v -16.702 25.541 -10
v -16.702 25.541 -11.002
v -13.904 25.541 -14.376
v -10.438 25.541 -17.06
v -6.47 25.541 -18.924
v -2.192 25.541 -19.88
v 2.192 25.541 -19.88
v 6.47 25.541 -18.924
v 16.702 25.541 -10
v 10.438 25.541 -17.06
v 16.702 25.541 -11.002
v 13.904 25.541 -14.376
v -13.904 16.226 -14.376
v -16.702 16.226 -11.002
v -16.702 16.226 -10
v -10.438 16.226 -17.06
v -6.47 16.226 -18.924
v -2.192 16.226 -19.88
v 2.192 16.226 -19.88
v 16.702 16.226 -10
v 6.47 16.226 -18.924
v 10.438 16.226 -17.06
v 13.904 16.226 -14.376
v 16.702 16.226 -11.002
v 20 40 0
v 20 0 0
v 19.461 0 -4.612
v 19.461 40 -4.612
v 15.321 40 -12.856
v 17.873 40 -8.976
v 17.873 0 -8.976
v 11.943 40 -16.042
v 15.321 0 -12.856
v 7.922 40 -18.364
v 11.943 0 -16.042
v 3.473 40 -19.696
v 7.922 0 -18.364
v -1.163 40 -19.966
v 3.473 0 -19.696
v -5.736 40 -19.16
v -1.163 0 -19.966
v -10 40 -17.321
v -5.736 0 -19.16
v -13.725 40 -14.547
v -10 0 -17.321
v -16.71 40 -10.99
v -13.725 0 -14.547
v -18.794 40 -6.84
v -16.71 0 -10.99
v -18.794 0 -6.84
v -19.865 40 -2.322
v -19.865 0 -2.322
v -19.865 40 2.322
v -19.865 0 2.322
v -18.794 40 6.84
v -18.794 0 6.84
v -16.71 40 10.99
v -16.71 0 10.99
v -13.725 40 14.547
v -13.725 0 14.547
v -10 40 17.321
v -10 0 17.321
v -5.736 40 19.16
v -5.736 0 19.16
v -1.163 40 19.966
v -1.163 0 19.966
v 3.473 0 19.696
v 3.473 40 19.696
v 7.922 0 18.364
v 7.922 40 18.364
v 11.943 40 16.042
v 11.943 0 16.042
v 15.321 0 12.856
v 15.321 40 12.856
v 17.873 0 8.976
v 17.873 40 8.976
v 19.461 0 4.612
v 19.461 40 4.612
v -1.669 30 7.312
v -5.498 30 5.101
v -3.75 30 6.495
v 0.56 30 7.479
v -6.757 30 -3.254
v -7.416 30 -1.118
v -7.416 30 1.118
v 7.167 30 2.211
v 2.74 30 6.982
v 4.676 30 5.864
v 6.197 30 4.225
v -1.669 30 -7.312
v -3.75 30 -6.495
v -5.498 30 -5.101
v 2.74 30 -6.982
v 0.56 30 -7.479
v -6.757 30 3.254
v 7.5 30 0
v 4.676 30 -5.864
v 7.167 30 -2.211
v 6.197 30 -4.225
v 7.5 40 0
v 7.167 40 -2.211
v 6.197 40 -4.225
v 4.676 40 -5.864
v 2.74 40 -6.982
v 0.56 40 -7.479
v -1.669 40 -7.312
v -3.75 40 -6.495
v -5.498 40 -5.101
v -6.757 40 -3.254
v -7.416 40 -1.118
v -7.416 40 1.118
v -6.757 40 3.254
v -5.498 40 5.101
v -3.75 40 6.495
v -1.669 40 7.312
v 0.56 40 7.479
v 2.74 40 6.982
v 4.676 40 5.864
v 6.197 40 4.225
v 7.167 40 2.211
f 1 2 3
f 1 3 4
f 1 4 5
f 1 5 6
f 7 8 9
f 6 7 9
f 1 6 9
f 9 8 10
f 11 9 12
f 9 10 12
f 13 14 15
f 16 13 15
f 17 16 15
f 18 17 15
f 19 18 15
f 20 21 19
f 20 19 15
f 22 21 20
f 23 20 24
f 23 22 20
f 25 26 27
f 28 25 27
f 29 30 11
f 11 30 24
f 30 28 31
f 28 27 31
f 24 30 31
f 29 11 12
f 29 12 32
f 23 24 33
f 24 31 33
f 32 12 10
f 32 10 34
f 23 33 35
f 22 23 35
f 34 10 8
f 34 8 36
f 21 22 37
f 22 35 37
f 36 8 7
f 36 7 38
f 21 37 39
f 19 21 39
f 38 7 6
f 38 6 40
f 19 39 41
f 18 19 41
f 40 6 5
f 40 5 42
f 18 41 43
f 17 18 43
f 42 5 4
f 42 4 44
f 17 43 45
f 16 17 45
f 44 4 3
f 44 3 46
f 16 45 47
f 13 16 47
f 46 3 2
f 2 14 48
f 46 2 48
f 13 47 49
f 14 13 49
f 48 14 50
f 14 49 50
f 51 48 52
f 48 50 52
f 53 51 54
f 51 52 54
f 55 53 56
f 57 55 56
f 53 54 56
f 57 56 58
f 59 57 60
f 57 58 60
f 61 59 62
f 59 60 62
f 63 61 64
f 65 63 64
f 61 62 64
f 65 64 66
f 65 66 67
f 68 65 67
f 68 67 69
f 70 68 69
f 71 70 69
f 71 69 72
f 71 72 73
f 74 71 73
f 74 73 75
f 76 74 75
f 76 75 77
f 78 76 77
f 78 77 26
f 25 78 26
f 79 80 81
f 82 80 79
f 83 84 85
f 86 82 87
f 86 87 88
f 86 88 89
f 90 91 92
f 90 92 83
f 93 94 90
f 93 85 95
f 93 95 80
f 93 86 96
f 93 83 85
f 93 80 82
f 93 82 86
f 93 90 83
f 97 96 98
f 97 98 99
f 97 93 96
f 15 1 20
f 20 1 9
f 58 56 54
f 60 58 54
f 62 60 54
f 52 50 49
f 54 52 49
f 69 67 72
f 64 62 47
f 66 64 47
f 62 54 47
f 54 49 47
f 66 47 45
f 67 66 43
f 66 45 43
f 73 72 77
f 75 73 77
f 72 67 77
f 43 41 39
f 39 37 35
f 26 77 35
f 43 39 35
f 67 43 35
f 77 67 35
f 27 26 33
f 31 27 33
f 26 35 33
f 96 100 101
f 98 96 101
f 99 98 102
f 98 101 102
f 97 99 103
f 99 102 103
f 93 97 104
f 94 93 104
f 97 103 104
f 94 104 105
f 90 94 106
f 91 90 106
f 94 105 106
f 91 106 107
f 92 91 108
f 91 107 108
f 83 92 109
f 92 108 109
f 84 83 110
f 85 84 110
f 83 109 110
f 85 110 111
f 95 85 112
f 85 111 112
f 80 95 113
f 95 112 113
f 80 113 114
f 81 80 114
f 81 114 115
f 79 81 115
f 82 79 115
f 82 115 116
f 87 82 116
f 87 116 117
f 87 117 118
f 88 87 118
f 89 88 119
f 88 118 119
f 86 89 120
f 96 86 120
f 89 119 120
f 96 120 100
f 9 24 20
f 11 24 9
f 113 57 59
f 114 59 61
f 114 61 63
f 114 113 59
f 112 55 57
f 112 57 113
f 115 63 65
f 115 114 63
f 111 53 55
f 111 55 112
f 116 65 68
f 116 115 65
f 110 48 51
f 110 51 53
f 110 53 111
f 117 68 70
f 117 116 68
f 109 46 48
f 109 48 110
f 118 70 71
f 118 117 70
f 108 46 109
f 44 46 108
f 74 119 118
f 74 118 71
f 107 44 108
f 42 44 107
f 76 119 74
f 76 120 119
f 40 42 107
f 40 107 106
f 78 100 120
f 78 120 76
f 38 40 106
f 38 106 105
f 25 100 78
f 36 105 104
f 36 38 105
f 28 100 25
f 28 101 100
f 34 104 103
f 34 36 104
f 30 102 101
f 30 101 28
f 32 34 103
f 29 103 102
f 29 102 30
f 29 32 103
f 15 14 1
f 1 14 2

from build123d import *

# Parameters (mm, degrees)
SKETCH1_R           = 20
BOSS_EXTRUDE1_DEPTH = 40
SKETCH2_R           = 7.5
CUT_EXTRUDE1_DEPTH  = 10
SKETCH3_W           = 33.40458463
SKETCH3_H           = 9.314739944
CUT_EXTRUDE2_DEPTH  = 10


with BuildPart() as part:
    # Sketch1 → Boss-Extrude1 (new body)
    with BuildSketch(Plane(origin=(0, 0, 0), x_dir=(1, 0, 0), z_dir=(0, 1, 0))):
        Circle(SKETCH1_R)
    extrude(amount=BOSS_EXTRUDE1_DEPTH)

    # Sketch2 → Cut-Extrude1 (cut)
    with BuildSketch(Plane(origin=(0, 40, 0), x_dir=(1, 0, 0), z_dir=(0, 1, 0))):
        Circle(SKETCH2_R)
    extrude(amount=-CUT_EXTRUDE1_DEPTH, mode=Mode.SUBTRACT)

    # Sketch3 → Cut-Extrude2 (cut)
    with BuildSketch(Plane.XY.offset(-20)):
        with Locations((0, 20.883294305)):
            Rectangle(SKETCH3_W, SKETCH3_H)
    extrude(amount=CUT_EXTRUDE2_DEPTH, mode=Mode.SUBTRACT)


solid = part.part
